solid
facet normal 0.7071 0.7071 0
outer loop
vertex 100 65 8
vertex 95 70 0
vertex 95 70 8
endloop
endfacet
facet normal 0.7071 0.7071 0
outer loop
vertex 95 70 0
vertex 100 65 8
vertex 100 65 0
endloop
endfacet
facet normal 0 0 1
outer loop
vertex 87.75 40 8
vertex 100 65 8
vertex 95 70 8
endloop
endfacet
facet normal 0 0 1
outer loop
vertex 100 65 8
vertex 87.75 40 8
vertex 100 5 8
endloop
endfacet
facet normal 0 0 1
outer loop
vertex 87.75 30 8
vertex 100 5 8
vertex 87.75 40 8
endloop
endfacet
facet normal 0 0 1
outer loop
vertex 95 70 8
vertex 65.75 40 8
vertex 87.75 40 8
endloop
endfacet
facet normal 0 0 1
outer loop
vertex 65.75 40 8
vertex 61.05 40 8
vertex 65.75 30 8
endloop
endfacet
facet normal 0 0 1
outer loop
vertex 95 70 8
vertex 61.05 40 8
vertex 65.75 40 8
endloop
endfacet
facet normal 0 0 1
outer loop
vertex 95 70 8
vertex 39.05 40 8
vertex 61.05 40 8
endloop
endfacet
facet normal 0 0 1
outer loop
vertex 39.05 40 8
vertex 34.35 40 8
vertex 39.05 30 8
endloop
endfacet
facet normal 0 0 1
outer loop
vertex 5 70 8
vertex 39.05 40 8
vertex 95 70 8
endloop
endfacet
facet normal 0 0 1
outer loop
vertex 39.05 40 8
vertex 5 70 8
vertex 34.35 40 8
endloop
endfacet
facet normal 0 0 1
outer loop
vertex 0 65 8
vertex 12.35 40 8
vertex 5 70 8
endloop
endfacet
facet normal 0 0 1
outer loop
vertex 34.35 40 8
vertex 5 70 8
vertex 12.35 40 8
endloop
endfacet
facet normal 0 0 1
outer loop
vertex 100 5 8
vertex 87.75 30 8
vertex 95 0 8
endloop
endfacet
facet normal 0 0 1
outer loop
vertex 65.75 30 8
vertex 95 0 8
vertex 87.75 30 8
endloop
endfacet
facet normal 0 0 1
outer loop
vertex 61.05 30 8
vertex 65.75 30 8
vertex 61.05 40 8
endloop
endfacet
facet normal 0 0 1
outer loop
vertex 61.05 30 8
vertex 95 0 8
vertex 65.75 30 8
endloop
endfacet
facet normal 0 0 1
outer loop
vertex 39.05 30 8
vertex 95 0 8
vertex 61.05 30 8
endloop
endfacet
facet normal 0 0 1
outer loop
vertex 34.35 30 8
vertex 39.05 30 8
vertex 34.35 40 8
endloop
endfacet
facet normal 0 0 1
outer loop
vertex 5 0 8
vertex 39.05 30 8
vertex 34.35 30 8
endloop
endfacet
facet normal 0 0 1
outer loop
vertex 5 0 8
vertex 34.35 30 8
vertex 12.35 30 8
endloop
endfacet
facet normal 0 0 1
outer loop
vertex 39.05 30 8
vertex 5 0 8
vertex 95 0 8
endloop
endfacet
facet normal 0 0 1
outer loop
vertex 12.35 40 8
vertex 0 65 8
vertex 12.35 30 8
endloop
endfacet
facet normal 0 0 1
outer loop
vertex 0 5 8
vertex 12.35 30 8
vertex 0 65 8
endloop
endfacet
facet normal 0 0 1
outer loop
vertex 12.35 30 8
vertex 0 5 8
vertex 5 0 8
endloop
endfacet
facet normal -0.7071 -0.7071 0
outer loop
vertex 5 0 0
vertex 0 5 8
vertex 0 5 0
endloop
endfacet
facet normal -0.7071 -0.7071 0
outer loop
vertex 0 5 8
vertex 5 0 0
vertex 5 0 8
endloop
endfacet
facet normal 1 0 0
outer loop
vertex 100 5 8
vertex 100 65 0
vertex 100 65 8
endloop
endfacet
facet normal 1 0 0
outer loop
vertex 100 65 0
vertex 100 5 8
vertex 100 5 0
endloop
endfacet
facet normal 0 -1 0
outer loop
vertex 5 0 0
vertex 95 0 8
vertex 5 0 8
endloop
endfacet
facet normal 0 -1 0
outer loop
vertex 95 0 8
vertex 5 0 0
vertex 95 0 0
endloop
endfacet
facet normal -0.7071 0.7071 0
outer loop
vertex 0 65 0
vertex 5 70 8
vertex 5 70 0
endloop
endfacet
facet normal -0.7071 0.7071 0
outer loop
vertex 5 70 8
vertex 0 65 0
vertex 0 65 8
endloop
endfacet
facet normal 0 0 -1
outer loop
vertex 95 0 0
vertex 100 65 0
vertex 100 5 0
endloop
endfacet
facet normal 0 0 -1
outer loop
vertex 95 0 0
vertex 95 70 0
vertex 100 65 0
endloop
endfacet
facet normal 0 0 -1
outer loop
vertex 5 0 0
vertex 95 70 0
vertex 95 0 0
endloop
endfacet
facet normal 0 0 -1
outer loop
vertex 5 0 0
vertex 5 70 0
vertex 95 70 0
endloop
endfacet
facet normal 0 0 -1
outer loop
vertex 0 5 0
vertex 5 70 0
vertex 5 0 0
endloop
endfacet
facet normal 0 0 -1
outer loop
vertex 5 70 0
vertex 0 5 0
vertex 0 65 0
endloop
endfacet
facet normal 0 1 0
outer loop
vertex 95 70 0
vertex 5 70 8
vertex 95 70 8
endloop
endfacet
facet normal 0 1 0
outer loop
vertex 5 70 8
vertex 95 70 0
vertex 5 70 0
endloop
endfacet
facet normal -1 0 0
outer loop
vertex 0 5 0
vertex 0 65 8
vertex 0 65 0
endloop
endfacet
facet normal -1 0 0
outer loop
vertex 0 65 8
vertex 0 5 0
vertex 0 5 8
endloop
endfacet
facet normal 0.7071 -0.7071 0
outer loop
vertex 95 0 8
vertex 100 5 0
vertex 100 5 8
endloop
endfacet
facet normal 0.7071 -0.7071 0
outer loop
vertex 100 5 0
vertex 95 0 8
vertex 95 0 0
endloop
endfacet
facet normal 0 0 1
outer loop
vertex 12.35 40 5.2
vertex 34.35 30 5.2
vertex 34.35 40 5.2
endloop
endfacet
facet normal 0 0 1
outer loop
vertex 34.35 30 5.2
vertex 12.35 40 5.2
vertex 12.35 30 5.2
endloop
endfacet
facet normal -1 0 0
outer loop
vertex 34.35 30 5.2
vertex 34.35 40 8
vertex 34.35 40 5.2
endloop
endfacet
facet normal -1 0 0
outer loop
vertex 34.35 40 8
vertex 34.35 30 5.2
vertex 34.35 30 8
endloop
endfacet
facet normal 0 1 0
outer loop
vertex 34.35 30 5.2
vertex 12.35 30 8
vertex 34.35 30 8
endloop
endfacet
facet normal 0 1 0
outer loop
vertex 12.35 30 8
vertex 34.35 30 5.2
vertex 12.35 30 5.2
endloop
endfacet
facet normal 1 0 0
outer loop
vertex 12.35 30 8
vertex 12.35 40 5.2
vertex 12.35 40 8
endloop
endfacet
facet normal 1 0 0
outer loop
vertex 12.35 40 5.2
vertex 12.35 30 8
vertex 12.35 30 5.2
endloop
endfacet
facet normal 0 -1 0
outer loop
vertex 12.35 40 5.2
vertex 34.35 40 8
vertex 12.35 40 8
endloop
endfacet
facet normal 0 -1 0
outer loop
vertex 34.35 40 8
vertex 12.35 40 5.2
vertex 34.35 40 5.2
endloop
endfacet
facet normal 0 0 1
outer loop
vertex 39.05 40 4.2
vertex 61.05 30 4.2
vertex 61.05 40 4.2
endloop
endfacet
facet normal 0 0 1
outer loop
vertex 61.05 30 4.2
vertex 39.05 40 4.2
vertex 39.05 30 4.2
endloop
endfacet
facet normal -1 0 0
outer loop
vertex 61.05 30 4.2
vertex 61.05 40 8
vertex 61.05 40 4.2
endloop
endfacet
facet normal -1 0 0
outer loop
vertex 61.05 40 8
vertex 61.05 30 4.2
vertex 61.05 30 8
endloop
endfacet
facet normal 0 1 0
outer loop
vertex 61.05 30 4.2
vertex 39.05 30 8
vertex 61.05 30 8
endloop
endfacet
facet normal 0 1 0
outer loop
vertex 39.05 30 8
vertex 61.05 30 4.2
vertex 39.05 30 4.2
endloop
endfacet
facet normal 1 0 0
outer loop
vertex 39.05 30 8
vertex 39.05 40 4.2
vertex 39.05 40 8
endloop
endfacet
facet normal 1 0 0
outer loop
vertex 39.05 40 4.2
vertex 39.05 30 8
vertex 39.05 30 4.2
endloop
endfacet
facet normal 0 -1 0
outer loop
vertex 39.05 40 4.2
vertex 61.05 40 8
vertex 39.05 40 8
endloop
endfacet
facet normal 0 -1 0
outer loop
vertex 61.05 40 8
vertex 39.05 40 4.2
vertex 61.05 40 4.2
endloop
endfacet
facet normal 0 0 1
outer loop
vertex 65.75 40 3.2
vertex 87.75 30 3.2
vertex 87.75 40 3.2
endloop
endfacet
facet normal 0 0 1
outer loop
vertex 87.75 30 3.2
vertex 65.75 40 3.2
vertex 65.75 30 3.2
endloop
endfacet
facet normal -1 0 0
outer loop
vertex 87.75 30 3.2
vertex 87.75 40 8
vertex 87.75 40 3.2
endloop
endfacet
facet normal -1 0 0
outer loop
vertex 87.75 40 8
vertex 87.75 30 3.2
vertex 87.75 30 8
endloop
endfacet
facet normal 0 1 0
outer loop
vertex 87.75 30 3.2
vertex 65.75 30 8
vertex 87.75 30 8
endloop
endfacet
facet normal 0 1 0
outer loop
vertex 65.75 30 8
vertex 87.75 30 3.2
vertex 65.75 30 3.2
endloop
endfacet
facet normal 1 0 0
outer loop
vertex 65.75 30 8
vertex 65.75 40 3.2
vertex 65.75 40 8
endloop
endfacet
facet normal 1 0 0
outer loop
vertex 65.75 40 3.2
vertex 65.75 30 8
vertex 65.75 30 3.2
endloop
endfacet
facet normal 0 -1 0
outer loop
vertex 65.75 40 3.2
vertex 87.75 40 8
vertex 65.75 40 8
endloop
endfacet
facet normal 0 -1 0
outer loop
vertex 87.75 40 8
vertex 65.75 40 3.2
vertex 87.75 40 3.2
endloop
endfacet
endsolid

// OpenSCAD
$fn = 32;

// ----------------------------------------------------------------------
// Windowed plate: 3 voids, 100 x 70 x 8 mm
// ----------------------------------------------------------------------

// --- parameters (mm) ---
plate_l = 100;            // plate length, X
plate_w = 70;             // plate width, Y
plate_t = 8;              // plate thickness, Z
edge_margin = 10;         // wall from the plate edge to any window
windows = 3;              // number of windows in the row
win_l = 22;               // window length
win_w = 10;               // window width
win_pitch = 26.7;         // window pitch along X
depth_1 = 2.8;            // depth of void 1 (full thickness = through)
depth_2 = 3.8;            // depth of void 2 (full thickness = through)
depth_3 = 4.8;            // depth of void 3 (full thickness = through)
corner_c = 5;             // corner chamfer of the plate

profile = [[5, 0], [95, 0], [100, 5], [100, 65], [95, 70], [5, 70], [0, 65], [0, 5]];  // primary outline, 8 points, counter clockwise
void_1 = [[12.35, 30], [34.35, 30], [34.35, 40], [12.35, 40]];  // window 1 of the row, 4 points
void_2 = [[39.05, 30], [61.05, 30], [61.05, 40], [39.05, 40]];  // window 2 of the row, 4 points
void_3 = [[65.75, 30], [87.75, 30], [87.75, 40], [65.75, 40]];  // window 3 of the row, 4 points

// --- the one profile operation ---
difference() {
  linear_extrude(height = plate_t) polygon(points = profile);
  translate([0, 0, plate_t - depth_1])
    linear_extrude(height = depth_1 + 1) polygon(points = void_1);
  translate([0, 0, plate_t - depth_2])
    linear_extrude(height = depth_2 + 1) polygon(points = void_2);
  translate([0, 0, plate_t - depth_3])
    linear_extrude(height = depth_3 + 1) polygon(points = void_3);
}
